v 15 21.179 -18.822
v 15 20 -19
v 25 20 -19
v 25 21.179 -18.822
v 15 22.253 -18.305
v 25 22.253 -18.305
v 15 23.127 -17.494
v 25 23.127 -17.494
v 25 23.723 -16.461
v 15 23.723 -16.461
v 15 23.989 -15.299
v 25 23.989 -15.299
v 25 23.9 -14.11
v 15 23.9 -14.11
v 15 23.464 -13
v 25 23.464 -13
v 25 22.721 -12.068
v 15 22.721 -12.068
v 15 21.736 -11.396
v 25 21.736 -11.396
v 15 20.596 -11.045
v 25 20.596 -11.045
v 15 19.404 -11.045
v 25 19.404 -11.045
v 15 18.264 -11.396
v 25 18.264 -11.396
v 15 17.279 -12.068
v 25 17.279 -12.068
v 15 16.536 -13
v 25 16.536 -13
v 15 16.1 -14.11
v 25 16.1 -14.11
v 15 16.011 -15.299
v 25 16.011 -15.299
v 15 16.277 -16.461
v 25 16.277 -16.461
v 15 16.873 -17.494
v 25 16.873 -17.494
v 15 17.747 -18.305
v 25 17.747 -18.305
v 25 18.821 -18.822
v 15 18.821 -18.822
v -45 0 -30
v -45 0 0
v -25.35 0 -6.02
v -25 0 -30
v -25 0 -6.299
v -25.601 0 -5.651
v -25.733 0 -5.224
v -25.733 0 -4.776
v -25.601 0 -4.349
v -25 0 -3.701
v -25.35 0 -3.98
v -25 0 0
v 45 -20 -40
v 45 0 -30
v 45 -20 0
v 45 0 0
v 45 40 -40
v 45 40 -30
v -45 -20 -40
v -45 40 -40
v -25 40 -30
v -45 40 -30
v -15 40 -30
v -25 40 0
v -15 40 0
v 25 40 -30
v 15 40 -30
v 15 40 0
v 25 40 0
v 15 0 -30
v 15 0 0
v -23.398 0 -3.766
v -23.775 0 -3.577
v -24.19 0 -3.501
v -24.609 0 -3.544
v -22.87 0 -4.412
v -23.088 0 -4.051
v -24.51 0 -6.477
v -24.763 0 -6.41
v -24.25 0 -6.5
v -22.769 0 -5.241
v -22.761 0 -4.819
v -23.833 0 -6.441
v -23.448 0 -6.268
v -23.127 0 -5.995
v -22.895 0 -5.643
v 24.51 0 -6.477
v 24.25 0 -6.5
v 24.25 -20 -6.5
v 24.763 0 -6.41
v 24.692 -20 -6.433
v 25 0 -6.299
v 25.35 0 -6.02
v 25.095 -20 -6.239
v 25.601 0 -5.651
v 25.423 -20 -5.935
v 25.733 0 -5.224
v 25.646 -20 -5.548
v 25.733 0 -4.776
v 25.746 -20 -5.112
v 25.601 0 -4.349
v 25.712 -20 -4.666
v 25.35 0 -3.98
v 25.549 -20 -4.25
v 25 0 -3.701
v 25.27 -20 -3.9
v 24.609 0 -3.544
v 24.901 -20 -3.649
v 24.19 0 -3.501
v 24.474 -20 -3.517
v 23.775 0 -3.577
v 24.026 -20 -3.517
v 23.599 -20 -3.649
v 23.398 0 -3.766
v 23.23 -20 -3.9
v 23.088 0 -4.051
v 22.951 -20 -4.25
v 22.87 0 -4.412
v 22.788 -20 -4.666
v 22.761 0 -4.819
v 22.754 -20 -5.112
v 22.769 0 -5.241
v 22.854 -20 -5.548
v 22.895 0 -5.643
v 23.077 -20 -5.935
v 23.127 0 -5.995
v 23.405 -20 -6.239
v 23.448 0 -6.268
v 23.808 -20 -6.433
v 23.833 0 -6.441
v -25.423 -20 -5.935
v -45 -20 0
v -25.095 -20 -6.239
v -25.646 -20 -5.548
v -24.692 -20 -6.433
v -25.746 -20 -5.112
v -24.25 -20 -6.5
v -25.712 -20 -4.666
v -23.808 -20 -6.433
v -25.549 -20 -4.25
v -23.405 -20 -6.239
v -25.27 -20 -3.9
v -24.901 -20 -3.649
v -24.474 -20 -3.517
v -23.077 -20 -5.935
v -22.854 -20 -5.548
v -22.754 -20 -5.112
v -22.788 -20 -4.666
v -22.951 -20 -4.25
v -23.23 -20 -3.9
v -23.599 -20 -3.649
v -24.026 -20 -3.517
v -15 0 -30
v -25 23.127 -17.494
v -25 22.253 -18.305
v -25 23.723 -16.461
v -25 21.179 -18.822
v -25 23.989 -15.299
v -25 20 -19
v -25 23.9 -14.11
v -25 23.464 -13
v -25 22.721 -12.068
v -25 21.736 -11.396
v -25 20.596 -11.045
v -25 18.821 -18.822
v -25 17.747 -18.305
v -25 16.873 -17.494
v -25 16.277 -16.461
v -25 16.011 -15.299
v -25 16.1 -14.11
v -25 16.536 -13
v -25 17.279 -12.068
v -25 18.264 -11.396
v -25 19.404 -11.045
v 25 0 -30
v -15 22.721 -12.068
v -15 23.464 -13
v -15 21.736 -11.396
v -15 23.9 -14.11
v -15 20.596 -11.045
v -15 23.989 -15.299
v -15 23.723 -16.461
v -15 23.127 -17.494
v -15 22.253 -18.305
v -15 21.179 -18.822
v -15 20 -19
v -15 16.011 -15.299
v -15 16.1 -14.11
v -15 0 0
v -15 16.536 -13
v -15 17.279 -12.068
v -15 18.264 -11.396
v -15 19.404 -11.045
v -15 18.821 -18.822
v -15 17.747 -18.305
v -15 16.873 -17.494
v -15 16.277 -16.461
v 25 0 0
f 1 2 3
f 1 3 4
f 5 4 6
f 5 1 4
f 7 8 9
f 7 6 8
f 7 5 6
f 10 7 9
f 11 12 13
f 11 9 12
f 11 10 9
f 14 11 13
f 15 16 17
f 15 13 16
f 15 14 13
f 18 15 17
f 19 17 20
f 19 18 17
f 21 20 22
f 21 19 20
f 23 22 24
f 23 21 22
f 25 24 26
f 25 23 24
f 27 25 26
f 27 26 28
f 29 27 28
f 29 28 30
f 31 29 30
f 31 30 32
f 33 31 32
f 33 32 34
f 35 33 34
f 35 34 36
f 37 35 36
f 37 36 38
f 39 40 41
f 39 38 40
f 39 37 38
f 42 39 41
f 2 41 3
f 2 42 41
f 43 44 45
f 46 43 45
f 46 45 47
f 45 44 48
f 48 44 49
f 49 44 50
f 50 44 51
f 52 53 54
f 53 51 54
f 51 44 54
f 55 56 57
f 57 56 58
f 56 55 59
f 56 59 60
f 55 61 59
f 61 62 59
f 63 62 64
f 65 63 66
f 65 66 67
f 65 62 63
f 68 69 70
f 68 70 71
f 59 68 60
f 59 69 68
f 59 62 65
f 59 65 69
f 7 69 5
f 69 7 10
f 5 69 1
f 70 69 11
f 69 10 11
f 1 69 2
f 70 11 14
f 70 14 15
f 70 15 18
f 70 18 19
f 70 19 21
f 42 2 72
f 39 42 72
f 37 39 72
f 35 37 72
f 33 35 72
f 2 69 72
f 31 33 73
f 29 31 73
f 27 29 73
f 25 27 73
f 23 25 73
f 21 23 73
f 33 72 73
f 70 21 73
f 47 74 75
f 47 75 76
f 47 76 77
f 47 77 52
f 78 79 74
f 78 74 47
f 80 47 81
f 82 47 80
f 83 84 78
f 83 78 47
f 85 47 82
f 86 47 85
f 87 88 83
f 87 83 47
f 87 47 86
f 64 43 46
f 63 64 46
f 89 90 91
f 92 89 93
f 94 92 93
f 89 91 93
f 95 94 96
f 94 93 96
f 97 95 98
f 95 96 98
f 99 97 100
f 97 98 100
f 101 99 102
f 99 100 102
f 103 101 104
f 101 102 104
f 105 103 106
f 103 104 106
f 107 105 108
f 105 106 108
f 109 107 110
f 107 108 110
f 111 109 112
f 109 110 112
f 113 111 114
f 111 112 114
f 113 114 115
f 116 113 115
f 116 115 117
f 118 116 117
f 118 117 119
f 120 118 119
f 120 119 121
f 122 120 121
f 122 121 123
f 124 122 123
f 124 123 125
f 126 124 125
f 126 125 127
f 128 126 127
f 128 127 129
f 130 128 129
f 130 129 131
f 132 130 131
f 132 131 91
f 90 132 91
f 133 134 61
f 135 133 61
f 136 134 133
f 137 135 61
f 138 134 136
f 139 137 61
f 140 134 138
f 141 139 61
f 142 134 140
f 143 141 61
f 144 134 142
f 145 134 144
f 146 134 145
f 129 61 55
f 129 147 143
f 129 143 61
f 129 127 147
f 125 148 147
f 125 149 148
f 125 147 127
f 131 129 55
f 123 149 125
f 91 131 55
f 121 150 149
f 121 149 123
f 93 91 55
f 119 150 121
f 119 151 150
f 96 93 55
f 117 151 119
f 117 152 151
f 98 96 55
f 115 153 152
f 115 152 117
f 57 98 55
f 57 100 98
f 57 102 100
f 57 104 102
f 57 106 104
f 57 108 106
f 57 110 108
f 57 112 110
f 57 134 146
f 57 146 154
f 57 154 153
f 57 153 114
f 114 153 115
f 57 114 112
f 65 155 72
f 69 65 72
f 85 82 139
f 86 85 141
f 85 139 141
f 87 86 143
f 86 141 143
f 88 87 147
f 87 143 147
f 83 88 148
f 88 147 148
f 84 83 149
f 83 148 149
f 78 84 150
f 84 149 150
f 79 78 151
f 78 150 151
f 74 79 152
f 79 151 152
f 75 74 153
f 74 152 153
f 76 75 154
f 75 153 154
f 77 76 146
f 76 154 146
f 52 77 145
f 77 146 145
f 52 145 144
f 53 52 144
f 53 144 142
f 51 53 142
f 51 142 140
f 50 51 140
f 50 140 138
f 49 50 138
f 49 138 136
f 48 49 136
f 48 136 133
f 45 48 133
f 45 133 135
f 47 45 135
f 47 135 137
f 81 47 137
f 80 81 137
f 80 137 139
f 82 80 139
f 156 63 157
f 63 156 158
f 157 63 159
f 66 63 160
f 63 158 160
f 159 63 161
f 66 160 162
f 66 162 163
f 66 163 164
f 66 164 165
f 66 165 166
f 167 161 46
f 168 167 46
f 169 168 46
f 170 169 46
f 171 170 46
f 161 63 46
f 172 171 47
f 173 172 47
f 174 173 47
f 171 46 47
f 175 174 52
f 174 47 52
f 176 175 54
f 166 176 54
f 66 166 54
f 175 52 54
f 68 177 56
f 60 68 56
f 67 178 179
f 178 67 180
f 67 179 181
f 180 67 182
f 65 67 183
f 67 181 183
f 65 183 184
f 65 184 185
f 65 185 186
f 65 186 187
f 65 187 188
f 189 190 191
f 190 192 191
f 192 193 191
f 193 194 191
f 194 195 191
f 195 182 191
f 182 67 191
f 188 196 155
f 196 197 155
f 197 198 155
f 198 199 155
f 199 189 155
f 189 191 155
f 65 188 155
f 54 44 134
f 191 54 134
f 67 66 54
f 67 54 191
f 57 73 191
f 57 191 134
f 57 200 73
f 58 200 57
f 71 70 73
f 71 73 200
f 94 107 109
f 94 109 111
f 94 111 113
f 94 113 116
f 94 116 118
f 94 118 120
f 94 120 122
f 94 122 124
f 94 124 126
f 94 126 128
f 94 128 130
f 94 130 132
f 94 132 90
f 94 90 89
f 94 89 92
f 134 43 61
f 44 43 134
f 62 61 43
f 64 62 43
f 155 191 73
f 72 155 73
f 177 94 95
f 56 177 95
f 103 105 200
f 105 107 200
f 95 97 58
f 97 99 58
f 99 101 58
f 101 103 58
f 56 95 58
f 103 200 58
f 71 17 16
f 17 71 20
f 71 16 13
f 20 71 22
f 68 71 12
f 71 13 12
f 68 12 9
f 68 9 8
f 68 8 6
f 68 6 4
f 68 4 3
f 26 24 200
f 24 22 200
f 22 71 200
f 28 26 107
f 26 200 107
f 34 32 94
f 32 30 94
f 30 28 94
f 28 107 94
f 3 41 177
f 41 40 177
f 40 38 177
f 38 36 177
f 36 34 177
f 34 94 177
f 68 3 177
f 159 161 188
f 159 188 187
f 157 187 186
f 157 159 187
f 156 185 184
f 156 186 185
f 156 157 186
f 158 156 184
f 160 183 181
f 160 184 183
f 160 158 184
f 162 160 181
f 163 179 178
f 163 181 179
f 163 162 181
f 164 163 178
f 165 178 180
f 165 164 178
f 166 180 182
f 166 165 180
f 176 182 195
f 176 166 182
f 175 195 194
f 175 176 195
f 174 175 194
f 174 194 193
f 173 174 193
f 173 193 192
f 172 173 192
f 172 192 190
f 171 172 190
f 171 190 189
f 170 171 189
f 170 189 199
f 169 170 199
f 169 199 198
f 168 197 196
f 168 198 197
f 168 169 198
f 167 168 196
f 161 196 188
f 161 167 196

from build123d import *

# Parameters (mm, degrees)
SKETCH3_W               = 20
SKETCH3_H               = 10
BOSS_EXTRUDE1_DEPTH     = 40
CUT_EXTRUDE1_DEPTH      = 83.462112512
CUT_EXTRUDE1_DEPTH_BACK = 83.462112512
SKETCH4_R               = 4
SKETCH7_W               = 90
SKETCH7_H               = 40
BOSS_EXTRUDE3_DEPTH     = 20
SKETCH8_R               = 1.5
CUT_EXTRUDE3_DEPTH      = 20


with BuildPart() as part:
    # Sketch3 → Boss-Extrude1 (new body)
    with BuildSketch(Plane(origin=(0, 0, 0), x_dir=(1, 0, 0), z_dir=(0, 1, 0))):
        with Locations((-35, 35)):
            Rectangle(SKETCH3_W, SKETCH3_H)
        Polygon((-25, 30), (-25, 0), (-15, 0), (-15, 30), (0, 30), (0, 40), (-25, 40), align=None)
        Polygon((0, 40), (0, 30), (15, 30), (15, 0), (25, 0), (25, 30), (25, 40), align=None)
        with Locations((35, 35)):
            Rectangle(SKETCH3_W, SKETCH3_H)
    extrude(amount=BOSS_EXTRUDE1_DEPTH)

    # Sketch4 → Cut-Extrude1 (cut, two sides: drawn at the far end of the back side and taken through both)
    with BuildSketch(Plane(origin=(-15, 0, 0), x_dir=(0, 0, -1), z_dir=(1, 0, 0)).offset(-CUT_EXTRUDE1_DEPTH_BACK)):
        with Locations((15, 20)):
            Circle(SKETCH4_R)
    extrude(amount=CUT_EXTRUDE1_DEPTH + CUT_EXTRUDE1_DEPTH_BACK, mode=Mode.SUBTRACT)

    # Sketch7 → Boss-Extrude3 (add)
    with BuildSketch(Plane.XZ):
        with Locations((0, -20)):
            Rectangle(SKETCH7_W, SKETCH7_H)
    extrude(amount=BOSS_EXTRUDE3_DEPTH)

    # Sketch8 → Cut-Extrude3 (cut)
    with BuildSketch(Plane.XZ.offset(20)):
        with Locations(Location((-24.25, -5, 0), (0, 0, 270))):
            Circle(SKETCH8_R)
        with Locations(Location((24.25, -5, 0), (0, 0, 270))):
            Circle(SKETCH8_R)
    extrude(amount=-CUT_EXTRUDE3_DEPTH, mode=Mode.SUBTRACT)


solid = part.part
